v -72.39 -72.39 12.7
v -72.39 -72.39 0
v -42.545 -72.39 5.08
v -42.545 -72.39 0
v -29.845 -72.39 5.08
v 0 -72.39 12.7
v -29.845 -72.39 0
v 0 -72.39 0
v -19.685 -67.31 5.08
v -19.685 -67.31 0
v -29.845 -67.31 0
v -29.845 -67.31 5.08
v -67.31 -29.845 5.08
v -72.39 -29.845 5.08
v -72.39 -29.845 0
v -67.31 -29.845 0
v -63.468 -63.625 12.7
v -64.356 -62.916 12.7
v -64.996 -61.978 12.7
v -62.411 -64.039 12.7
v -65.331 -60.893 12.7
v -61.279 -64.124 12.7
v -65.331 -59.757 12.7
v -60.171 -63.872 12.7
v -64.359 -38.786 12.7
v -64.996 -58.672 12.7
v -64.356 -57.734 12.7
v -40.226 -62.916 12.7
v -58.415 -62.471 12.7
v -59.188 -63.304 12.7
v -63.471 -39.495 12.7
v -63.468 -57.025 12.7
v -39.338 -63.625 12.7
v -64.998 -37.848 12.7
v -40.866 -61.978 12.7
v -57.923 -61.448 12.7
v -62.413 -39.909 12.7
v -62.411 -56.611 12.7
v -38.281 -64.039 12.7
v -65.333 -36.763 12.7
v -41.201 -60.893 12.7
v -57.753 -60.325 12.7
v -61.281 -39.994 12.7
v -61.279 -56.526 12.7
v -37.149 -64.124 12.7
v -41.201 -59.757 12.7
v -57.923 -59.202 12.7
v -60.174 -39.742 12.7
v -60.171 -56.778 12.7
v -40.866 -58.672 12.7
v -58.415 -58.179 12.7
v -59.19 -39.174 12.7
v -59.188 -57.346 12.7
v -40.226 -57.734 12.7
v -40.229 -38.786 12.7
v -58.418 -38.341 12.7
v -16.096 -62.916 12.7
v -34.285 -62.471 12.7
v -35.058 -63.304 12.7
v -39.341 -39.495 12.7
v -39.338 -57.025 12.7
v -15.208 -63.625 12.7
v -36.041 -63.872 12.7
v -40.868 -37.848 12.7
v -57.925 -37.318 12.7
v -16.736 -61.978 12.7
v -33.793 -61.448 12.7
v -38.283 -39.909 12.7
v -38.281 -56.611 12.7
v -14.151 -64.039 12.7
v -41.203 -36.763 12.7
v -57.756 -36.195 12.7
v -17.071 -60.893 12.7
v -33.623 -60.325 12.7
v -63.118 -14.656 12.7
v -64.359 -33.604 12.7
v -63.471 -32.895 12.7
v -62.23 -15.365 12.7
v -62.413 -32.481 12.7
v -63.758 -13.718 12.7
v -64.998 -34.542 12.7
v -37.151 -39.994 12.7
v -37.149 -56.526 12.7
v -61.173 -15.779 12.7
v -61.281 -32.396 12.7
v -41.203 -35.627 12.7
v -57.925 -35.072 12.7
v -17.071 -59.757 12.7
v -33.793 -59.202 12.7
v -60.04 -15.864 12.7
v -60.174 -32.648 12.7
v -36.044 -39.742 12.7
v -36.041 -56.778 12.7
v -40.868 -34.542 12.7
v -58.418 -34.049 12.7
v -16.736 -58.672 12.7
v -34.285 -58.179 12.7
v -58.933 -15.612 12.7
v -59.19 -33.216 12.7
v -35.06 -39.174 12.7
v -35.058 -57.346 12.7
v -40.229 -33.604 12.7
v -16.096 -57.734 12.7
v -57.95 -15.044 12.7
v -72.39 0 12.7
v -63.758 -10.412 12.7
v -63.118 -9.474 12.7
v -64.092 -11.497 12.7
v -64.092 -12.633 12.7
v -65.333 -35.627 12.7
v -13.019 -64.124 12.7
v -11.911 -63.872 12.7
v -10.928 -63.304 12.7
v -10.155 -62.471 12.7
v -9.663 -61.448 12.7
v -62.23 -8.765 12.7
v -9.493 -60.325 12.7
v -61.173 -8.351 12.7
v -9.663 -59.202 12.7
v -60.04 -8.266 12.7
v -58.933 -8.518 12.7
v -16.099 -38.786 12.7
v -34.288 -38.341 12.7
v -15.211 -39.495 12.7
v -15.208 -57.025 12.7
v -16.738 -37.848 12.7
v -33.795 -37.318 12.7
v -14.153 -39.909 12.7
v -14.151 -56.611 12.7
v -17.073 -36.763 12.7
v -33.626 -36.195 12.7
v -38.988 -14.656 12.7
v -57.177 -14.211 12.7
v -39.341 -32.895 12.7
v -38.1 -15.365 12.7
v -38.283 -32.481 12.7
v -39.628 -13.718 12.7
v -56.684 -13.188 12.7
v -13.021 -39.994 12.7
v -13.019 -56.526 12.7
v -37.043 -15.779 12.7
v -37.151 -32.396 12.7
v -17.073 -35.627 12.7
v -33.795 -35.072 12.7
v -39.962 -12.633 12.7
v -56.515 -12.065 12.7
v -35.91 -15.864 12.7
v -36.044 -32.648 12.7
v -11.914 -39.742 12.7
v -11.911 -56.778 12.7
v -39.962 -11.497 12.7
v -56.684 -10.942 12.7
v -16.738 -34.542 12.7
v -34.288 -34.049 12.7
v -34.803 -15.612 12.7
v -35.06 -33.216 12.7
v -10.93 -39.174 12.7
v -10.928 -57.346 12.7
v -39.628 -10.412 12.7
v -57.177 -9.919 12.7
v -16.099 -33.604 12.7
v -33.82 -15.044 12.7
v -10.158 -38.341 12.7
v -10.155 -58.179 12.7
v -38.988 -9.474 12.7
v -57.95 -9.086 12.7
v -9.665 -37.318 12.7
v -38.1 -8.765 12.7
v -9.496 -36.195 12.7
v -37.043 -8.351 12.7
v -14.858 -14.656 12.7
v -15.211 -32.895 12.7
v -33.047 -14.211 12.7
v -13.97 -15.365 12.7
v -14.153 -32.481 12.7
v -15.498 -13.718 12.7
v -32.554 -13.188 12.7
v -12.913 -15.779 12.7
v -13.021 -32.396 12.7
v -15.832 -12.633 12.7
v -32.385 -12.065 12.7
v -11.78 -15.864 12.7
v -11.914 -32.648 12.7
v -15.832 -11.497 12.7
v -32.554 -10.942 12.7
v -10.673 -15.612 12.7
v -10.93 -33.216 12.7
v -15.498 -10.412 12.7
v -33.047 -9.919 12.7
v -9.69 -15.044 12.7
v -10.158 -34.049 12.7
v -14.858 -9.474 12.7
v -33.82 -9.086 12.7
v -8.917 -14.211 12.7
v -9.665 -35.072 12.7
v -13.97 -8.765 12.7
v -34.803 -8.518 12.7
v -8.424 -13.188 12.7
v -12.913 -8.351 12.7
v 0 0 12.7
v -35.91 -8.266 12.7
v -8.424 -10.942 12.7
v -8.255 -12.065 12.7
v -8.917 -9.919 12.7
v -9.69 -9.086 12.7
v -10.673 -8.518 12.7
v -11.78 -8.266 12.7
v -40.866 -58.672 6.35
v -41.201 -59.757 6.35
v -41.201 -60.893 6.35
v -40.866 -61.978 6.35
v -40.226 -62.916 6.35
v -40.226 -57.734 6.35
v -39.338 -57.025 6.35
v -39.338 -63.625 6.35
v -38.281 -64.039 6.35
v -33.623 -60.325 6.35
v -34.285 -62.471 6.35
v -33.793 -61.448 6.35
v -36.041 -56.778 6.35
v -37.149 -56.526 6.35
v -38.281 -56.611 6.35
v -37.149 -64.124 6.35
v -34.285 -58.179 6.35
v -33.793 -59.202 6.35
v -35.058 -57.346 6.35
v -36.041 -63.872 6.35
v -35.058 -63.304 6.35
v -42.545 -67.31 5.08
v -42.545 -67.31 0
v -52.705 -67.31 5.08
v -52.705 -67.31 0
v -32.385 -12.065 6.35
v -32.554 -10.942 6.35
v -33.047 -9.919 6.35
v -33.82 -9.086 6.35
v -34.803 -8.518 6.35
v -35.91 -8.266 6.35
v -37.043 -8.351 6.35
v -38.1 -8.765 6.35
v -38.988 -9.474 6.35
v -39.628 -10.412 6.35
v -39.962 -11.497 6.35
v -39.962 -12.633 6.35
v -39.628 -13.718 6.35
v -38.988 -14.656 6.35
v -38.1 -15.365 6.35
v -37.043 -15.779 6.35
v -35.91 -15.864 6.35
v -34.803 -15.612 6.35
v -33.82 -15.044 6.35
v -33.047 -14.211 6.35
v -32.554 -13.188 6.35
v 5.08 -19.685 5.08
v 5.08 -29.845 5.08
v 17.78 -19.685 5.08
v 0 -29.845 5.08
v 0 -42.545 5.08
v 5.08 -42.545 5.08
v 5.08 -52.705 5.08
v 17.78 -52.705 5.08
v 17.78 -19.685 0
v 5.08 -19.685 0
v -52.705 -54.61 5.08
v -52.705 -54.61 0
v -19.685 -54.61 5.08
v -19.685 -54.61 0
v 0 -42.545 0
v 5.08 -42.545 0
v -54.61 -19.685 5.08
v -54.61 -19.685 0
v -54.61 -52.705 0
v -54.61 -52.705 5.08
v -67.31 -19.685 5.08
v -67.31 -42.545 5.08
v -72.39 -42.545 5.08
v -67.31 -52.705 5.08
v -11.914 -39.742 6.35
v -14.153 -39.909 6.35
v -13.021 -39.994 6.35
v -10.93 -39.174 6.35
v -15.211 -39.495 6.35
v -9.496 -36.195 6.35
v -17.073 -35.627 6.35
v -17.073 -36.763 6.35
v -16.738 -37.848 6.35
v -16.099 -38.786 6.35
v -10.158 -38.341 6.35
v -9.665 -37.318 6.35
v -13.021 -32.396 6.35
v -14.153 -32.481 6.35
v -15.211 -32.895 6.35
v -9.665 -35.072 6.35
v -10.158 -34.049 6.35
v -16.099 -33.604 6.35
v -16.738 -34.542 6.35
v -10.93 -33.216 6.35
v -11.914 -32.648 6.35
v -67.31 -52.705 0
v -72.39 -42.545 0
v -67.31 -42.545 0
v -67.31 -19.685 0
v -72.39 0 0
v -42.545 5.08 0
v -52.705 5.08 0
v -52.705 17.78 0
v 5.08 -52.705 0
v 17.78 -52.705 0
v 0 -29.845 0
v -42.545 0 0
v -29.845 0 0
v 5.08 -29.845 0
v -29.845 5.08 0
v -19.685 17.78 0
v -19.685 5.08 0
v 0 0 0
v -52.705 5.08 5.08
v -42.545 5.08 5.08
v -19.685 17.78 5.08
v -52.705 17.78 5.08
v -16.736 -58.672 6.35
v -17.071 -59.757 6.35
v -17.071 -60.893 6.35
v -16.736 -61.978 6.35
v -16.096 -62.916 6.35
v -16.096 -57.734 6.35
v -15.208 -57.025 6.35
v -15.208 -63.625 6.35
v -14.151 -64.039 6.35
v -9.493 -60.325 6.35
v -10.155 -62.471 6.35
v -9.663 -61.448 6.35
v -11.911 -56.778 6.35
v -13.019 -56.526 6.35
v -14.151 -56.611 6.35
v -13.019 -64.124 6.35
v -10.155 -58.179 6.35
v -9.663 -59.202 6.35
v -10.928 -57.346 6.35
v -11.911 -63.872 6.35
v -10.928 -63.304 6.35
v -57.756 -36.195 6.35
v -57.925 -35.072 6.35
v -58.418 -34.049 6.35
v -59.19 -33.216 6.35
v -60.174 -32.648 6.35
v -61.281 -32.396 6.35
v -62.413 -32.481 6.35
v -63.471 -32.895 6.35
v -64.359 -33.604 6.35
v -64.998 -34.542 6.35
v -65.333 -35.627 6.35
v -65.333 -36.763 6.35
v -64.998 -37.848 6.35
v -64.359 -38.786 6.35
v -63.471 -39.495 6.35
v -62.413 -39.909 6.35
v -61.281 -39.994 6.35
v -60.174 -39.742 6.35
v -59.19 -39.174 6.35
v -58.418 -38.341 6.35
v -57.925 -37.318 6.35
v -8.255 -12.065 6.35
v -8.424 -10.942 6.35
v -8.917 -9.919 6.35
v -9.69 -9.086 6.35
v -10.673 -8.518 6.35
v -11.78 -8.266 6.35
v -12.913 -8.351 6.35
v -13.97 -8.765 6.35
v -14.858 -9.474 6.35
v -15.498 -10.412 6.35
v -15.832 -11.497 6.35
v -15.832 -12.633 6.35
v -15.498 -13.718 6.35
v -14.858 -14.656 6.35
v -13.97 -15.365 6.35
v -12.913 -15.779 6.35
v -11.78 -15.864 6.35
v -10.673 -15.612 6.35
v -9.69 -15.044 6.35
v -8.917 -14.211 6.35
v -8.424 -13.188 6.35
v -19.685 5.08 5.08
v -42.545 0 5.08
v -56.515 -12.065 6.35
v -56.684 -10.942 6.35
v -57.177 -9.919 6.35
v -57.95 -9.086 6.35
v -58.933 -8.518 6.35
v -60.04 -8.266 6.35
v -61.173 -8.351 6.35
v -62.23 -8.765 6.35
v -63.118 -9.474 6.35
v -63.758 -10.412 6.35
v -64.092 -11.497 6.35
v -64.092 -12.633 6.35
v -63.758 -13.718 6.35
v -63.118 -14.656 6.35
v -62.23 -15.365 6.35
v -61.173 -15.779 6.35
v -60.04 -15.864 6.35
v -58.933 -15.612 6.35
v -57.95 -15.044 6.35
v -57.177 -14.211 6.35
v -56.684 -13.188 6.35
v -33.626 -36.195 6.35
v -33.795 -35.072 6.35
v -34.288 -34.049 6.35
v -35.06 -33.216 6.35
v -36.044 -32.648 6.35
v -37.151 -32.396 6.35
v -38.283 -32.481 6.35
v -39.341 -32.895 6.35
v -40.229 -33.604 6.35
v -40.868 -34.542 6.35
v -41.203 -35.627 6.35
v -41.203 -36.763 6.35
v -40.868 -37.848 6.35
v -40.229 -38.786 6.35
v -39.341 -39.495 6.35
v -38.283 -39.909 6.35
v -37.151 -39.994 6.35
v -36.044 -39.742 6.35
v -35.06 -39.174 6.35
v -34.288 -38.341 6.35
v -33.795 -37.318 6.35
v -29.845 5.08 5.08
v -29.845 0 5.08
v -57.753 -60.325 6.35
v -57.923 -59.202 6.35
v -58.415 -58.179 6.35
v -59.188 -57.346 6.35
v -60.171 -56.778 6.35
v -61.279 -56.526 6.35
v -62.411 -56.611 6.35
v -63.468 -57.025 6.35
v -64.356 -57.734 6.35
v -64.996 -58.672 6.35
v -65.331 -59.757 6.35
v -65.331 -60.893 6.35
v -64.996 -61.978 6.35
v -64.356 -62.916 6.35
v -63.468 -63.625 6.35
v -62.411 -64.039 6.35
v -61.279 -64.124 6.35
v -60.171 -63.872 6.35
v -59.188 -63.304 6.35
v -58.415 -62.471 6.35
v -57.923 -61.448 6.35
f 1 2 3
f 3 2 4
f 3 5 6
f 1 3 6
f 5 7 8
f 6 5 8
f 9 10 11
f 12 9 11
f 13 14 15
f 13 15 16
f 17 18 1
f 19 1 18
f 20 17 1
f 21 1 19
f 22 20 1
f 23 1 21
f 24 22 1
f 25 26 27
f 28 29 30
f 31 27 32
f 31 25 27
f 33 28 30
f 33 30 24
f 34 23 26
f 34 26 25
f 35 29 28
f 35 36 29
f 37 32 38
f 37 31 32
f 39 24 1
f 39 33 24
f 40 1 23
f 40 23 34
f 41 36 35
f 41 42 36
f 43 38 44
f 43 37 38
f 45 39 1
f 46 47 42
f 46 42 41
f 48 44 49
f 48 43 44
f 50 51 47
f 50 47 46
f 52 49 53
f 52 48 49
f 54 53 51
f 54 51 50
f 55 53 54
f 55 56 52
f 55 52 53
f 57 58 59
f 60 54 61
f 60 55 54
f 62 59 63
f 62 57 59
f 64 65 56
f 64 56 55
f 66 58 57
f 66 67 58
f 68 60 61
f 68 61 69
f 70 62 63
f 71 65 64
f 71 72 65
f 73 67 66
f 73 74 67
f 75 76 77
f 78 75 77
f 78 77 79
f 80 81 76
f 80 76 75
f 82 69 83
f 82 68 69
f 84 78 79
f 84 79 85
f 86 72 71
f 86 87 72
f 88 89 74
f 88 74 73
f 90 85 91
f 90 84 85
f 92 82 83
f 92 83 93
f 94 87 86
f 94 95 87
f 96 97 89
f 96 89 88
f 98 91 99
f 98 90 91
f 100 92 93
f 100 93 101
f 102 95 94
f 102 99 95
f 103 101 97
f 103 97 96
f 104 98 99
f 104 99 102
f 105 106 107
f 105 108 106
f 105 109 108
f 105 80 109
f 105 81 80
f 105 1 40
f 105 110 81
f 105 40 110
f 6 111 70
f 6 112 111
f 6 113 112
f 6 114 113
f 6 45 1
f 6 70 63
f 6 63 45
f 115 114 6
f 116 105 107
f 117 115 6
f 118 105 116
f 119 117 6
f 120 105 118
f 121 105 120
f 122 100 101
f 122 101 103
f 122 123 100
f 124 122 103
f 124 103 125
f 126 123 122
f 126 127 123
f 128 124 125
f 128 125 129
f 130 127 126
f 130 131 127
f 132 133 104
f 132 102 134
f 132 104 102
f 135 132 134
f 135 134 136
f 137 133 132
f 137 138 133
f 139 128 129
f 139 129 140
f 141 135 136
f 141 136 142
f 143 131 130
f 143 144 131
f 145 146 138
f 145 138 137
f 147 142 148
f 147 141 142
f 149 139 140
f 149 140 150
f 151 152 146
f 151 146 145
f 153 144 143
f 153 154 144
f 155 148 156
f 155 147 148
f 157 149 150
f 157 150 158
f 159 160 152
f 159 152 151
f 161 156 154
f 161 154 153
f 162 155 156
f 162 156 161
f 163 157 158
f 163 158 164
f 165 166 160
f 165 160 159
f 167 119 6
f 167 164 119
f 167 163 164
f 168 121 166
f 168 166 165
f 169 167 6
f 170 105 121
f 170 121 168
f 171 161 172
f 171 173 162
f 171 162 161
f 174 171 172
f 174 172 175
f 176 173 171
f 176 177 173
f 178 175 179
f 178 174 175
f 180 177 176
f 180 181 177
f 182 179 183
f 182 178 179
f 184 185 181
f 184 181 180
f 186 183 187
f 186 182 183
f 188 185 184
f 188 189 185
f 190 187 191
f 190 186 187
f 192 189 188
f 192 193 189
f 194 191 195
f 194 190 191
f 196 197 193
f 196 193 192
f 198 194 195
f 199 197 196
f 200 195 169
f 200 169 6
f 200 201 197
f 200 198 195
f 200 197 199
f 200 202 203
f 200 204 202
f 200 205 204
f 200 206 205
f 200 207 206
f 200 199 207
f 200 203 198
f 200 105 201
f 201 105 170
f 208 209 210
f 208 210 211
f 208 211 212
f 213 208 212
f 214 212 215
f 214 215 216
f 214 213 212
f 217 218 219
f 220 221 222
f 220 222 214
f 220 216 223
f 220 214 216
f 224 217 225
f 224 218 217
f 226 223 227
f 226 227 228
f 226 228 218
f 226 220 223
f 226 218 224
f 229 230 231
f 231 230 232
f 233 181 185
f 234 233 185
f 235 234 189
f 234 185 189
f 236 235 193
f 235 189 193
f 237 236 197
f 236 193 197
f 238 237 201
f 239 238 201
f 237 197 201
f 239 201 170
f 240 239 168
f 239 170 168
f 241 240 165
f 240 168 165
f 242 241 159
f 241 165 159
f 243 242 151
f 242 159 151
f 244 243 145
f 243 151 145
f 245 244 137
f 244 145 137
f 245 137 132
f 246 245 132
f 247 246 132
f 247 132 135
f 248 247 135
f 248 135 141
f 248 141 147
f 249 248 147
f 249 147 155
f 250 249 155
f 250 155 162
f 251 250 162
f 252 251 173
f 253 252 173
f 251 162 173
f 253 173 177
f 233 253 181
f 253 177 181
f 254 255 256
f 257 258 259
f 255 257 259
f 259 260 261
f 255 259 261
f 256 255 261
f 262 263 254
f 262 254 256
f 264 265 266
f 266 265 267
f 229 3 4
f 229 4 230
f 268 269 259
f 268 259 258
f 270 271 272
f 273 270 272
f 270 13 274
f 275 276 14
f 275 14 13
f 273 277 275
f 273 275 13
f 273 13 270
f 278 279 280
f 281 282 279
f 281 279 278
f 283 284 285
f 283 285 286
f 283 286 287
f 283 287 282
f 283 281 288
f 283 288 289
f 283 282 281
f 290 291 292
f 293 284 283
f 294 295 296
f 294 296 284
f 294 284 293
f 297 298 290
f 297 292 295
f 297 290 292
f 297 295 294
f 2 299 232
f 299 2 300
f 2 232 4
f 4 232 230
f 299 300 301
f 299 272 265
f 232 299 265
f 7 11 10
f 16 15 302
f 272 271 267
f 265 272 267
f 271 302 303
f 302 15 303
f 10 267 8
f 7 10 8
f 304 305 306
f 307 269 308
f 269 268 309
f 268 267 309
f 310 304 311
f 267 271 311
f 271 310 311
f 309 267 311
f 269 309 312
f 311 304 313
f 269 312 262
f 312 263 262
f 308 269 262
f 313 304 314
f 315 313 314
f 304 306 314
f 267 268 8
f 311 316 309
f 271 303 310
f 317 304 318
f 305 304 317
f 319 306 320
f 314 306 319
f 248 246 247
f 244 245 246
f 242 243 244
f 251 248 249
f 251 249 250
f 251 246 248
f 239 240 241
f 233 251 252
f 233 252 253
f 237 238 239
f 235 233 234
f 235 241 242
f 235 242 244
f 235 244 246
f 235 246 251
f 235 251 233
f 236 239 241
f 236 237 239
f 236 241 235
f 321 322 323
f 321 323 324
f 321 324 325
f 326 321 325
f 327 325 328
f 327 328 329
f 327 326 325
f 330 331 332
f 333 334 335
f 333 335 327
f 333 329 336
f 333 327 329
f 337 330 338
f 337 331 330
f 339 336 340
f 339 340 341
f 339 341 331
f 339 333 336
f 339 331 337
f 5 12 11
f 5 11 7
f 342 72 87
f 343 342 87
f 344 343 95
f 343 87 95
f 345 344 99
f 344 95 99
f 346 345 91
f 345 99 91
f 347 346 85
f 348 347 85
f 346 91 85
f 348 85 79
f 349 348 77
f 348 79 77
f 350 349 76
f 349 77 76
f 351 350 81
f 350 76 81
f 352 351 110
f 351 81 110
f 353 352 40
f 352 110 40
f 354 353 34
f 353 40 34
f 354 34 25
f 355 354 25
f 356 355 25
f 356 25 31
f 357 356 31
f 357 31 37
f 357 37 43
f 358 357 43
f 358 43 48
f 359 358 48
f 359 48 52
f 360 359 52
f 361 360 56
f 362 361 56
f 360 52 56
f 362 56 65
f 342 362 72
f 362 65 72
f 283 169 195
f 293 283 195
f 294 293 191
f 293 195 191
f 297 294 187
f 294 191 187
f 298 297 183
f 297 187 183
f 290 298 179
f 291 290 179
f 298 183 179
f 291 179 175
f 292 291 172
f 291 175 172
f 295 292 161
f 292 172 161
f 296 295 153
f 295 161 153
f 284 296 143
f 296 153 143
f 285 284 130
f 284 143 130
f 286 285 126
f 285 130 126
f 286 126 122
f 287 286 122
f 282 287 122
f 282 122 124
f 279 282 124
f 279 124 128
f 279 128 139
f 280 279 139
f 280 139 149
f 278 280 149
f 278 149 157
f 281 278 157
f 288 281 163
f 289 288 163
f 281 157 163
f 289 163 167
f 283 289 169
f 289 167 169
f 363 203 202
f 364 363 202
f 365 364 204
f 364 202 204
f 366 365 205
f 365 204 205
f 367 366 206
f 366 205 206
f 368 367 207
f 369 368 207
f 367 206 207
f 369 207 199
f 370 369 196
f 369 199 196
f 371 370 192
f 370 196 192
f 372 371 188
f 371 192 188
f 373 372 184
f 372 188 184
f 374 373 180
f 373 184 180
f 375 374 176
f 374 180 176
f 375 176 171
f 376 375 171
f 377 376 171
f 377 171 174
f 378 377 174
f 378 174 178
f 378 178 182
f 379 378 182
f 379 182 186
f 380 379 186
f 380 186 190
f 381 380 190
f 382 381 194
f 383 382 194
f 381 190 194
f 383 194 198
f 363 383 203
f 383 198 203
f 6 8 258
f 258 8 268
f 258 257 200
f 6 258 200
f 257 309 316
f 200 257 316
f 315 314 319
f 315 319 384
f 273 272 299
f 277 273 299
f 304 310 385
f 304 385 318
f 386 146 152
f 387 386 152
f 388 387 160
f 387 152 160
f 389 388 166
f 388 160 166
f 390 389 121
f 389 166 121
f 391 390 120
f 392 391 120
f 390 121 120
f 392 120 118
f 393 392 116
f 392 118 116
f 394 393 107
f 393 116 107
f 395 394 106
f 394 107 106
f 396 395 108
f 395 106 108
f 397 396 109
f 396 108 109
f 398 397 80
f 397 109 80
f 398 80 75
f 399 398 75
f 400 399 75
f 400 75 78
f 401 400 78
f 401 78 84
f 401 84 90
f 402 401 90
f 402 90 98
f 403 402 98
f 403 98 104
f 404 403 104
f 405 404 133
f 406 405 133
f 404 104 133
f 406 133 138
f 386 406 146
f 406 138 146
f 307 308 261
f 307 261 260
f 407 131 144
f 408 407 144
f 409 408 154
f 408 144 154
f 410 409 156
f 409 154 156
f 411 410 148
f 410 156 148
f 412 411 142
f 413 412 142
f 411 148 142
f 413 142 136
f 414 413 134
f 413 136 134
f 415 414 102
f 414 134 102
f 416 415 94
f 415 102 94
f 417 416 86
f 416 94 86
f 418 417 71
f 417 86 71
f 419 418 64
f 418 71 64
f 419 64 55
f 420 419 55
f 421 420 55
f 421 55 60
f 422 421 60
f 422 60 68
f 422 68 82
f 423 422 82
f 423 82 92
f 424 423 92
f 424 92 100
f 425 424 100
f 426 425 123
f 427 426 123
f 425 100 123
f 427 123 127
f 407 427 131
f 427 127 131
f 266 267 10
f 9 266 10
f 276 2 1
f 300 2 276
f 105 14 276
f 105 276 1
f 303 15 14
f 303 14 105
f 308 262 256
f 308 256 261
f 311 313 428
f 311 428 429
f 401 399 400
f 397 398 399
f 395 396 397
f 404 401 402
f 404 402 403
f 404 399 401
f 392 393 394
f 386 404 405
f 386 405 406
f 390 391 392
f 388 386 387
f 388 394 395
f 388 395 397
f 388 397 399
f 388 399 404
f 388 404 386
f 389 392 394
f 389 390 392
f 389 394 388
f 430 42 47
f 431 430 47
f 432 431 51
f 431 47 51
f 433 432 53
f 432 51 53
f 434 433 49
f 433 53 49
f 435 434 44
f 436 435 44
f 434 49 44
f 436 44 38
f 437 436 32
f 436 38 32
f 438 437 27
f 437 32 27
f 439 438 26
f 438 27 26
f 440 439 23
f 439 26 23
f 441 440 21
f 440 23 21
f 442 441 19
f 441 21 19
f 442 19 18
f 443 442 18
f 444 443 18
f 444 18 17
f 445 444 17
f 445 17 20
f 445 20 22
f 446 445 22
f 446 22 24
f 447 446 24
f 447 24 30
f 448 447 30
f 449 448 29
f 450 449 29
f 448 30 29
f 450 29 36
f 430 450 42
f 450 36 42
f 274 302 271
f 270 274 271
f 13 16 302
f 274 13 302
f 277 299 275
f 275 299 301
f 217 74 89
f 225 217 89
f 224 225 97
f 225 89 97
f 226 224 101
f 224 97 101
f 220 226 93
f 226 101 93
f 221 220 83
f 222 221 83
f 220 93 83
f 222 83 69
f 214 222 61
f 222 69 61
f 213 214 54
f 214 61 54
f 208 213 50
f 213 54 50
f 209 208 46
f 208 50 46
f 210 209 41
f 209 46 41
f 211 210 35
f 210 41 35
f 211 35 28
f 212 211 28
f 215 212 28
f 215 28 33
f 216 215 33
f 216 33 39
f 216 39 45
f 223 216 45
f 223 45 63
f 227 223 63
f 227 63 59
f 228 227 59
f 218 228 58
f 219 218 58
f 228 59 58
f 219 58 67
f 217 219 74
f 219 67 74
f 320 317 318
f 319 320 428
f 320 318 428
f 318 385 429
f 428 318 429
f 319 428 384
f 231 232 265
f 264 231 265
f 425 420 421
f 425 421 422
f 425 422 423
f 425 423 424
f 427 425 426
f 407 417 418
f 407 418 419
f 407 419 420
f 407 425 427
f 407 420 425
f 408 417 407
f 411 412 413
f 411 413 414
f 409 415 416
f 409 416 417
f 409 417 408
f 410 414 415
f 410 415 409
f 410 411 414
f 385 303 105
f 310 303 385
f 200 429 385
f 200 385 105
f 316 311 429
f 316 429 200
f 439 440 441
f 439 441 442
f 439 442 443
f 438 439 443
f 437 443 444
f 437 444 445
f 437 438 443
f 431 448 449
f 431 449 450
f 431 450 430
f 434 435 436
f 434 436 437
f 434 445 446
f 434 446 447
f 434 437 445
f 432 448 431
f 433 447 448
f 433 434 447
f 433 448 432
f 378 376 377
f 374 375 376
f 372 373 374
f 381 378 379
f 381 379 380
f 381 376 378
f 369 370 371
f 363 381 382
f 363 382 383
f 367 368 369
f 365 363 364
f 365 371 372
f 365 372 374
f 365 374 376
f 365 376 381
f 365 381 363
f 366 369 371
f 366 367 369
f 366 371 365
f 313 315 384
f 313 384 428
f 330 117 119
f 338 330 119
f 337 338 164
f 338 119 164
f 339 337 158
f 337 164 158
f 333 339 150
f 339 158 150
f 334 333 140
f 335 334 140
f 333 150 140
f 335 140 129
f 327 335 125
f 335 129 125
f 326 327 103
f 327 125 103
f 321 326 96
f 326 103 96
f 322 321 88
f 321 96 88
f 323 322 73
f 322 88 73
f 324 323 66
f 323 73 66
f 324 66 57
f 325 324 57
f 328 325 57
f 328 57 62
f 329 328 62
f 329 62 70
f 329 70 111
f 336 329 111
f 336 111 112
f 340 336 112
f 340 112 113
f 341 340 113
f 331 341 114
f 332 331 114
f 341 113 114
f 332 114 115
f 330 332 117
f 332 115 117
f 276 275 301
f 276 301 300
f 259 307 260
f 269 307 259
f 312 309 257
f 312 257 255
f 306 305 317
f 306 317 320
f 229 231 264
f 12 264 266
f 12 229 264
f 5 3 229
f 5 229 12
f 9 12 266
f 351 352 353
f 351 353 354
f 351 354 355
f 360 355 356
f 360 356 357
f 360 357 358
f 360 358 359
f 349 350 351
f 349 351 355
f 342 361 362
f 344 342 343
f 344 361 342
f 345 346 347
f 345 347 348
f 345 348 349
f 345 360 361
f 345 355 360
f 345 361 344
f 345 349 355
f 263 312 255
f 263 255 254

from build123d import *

# Parameters (mm, degrees)
F0_W     = 72.39
F0_H     = 72.39
F1_DEPTH = 12.7
F2_R     = 3.81
F3_DEPTH = 6.35
F5_DEPTH = 5.08
F7_DEPTH = 5.08
F8_W     = 4.1331201792
F8_H     = 7.04711047
F8_W_2   = 14.3668507226
F8_H_2   = 5.652282387
F9_DEPTH = 2.54


with BuildPart() as f1:
    # F0 (on Top) → F1 (new body)
    with BuildSketch(Plane.XY):
        with Locations((-36.195, -36.195)):
            Rectangle(F0_W, F0_H)
    extrude(amount=F1_DEPTH)

    # F2 (on face) → F3 (cut)
    with BuildSketch(Plane.XY.offset(12.7)):
        with Locations((-60.325, -12.065)):
            Circle(F2_R)
        with Locations((-61.5655786634, -36.195)):
            Circle(F2_R)
        with Locations((-61.5633073788, -60.325)):
            Circle(F2_R)
        with Locations((-36.195, -12.065)):
            Circle(F2_R)
        with Locations((-37.4355786634, -36.195)):
            Circle(F2_R)
        with Locations((-37.4333073788, -60.325)):
            Circle(F2_R)
        with Locations((-12.065, -12.065)):
            Circle(F2_R)
        with Locations((-13.3055786634, -36.195)):
            Circle(F2_R)
        with Locations((-13.3033073788, -60.325)):
            Circle(F2_R)
    extrude(amount=-F3_DEPTH, mode=Mode.SUBTRACT)

    # F4 (on face) → F5 (join)
    with BuildSketch(Plane(origin=(0, 0, 0), x_dir=(1, 0, 0), z_dir=(0, 0, -1))):
        Polygon((5.08, 42.545), (0, 42.545), (0, 29.845), (5.08, 29.845), (5.08, 19.685), (17.78, 19.685), (17.78, 52.705), (5.08, 52.705), align=None)
        Polygon((-29.845, -5.08), (-29.845, 0), (-42.545, 0), (-42.545, -5.08), (-52.705, -5.08), (-52.705, -17.78), (-19.685, -17.78), (-19.685, -5.08), align=None)
    extrude(amount=-F5_DEPTH)

    # F6 (on face) → F7 (cut)
    with BuildSketch(Plane(origin=(0, 0, 0), x_dir=(1, 0, 0), z_dir=(0, 0, -1))):
        Polygon((-44.1891504281, -29.484081471), (-56.8891504281, -29.484081471), (-56.8891504281, -42.184081471), (-44.1891504281, -42.184081471), (-44.1891504281, -54.884081471), (-31.4891504281, -54.884081471), (-31.4891504281, -17.78), (-44.1891504281, -17.78), align=None)
        Polygon((-72.39, 42.545), (-72.39, 29.845), (-67.31, 29.845), (-67.31, 19.685), (-54.61, 19.685), (-54.61, 52.705), (-67.31, 52.705), (-67.31, 42.545), align=None)
        Polygon((-29.845, 72.39), (-42.545, 72.39), (-42.545, 67.31), (-52.705, 67.31), (-52.705, 54.61), (-19.685, 54.61), (-19.685, 67.31), (-29.845, 67.31), align=None)
    extrude(amount=-F7_DEPTH, mode=Mode.SUBTRACT)

    # F8 (on face) → F9 (join)
    with BuildSketch(Plane(origin=(0, 0, 0), x_dir=(1, 0, 0), z_dir=(0, 0, -1))):
        with Locations((-36.4783331752, -0.2260982292)):
            Rectangle(F8_W, F8_H)
        with Locations((-3.0054978561, 35.1009014994)):
            Rectangle(F8_W_2, F8_H_2)
    extrude(amount=-F9_DEPTH)


solid = f1.part
